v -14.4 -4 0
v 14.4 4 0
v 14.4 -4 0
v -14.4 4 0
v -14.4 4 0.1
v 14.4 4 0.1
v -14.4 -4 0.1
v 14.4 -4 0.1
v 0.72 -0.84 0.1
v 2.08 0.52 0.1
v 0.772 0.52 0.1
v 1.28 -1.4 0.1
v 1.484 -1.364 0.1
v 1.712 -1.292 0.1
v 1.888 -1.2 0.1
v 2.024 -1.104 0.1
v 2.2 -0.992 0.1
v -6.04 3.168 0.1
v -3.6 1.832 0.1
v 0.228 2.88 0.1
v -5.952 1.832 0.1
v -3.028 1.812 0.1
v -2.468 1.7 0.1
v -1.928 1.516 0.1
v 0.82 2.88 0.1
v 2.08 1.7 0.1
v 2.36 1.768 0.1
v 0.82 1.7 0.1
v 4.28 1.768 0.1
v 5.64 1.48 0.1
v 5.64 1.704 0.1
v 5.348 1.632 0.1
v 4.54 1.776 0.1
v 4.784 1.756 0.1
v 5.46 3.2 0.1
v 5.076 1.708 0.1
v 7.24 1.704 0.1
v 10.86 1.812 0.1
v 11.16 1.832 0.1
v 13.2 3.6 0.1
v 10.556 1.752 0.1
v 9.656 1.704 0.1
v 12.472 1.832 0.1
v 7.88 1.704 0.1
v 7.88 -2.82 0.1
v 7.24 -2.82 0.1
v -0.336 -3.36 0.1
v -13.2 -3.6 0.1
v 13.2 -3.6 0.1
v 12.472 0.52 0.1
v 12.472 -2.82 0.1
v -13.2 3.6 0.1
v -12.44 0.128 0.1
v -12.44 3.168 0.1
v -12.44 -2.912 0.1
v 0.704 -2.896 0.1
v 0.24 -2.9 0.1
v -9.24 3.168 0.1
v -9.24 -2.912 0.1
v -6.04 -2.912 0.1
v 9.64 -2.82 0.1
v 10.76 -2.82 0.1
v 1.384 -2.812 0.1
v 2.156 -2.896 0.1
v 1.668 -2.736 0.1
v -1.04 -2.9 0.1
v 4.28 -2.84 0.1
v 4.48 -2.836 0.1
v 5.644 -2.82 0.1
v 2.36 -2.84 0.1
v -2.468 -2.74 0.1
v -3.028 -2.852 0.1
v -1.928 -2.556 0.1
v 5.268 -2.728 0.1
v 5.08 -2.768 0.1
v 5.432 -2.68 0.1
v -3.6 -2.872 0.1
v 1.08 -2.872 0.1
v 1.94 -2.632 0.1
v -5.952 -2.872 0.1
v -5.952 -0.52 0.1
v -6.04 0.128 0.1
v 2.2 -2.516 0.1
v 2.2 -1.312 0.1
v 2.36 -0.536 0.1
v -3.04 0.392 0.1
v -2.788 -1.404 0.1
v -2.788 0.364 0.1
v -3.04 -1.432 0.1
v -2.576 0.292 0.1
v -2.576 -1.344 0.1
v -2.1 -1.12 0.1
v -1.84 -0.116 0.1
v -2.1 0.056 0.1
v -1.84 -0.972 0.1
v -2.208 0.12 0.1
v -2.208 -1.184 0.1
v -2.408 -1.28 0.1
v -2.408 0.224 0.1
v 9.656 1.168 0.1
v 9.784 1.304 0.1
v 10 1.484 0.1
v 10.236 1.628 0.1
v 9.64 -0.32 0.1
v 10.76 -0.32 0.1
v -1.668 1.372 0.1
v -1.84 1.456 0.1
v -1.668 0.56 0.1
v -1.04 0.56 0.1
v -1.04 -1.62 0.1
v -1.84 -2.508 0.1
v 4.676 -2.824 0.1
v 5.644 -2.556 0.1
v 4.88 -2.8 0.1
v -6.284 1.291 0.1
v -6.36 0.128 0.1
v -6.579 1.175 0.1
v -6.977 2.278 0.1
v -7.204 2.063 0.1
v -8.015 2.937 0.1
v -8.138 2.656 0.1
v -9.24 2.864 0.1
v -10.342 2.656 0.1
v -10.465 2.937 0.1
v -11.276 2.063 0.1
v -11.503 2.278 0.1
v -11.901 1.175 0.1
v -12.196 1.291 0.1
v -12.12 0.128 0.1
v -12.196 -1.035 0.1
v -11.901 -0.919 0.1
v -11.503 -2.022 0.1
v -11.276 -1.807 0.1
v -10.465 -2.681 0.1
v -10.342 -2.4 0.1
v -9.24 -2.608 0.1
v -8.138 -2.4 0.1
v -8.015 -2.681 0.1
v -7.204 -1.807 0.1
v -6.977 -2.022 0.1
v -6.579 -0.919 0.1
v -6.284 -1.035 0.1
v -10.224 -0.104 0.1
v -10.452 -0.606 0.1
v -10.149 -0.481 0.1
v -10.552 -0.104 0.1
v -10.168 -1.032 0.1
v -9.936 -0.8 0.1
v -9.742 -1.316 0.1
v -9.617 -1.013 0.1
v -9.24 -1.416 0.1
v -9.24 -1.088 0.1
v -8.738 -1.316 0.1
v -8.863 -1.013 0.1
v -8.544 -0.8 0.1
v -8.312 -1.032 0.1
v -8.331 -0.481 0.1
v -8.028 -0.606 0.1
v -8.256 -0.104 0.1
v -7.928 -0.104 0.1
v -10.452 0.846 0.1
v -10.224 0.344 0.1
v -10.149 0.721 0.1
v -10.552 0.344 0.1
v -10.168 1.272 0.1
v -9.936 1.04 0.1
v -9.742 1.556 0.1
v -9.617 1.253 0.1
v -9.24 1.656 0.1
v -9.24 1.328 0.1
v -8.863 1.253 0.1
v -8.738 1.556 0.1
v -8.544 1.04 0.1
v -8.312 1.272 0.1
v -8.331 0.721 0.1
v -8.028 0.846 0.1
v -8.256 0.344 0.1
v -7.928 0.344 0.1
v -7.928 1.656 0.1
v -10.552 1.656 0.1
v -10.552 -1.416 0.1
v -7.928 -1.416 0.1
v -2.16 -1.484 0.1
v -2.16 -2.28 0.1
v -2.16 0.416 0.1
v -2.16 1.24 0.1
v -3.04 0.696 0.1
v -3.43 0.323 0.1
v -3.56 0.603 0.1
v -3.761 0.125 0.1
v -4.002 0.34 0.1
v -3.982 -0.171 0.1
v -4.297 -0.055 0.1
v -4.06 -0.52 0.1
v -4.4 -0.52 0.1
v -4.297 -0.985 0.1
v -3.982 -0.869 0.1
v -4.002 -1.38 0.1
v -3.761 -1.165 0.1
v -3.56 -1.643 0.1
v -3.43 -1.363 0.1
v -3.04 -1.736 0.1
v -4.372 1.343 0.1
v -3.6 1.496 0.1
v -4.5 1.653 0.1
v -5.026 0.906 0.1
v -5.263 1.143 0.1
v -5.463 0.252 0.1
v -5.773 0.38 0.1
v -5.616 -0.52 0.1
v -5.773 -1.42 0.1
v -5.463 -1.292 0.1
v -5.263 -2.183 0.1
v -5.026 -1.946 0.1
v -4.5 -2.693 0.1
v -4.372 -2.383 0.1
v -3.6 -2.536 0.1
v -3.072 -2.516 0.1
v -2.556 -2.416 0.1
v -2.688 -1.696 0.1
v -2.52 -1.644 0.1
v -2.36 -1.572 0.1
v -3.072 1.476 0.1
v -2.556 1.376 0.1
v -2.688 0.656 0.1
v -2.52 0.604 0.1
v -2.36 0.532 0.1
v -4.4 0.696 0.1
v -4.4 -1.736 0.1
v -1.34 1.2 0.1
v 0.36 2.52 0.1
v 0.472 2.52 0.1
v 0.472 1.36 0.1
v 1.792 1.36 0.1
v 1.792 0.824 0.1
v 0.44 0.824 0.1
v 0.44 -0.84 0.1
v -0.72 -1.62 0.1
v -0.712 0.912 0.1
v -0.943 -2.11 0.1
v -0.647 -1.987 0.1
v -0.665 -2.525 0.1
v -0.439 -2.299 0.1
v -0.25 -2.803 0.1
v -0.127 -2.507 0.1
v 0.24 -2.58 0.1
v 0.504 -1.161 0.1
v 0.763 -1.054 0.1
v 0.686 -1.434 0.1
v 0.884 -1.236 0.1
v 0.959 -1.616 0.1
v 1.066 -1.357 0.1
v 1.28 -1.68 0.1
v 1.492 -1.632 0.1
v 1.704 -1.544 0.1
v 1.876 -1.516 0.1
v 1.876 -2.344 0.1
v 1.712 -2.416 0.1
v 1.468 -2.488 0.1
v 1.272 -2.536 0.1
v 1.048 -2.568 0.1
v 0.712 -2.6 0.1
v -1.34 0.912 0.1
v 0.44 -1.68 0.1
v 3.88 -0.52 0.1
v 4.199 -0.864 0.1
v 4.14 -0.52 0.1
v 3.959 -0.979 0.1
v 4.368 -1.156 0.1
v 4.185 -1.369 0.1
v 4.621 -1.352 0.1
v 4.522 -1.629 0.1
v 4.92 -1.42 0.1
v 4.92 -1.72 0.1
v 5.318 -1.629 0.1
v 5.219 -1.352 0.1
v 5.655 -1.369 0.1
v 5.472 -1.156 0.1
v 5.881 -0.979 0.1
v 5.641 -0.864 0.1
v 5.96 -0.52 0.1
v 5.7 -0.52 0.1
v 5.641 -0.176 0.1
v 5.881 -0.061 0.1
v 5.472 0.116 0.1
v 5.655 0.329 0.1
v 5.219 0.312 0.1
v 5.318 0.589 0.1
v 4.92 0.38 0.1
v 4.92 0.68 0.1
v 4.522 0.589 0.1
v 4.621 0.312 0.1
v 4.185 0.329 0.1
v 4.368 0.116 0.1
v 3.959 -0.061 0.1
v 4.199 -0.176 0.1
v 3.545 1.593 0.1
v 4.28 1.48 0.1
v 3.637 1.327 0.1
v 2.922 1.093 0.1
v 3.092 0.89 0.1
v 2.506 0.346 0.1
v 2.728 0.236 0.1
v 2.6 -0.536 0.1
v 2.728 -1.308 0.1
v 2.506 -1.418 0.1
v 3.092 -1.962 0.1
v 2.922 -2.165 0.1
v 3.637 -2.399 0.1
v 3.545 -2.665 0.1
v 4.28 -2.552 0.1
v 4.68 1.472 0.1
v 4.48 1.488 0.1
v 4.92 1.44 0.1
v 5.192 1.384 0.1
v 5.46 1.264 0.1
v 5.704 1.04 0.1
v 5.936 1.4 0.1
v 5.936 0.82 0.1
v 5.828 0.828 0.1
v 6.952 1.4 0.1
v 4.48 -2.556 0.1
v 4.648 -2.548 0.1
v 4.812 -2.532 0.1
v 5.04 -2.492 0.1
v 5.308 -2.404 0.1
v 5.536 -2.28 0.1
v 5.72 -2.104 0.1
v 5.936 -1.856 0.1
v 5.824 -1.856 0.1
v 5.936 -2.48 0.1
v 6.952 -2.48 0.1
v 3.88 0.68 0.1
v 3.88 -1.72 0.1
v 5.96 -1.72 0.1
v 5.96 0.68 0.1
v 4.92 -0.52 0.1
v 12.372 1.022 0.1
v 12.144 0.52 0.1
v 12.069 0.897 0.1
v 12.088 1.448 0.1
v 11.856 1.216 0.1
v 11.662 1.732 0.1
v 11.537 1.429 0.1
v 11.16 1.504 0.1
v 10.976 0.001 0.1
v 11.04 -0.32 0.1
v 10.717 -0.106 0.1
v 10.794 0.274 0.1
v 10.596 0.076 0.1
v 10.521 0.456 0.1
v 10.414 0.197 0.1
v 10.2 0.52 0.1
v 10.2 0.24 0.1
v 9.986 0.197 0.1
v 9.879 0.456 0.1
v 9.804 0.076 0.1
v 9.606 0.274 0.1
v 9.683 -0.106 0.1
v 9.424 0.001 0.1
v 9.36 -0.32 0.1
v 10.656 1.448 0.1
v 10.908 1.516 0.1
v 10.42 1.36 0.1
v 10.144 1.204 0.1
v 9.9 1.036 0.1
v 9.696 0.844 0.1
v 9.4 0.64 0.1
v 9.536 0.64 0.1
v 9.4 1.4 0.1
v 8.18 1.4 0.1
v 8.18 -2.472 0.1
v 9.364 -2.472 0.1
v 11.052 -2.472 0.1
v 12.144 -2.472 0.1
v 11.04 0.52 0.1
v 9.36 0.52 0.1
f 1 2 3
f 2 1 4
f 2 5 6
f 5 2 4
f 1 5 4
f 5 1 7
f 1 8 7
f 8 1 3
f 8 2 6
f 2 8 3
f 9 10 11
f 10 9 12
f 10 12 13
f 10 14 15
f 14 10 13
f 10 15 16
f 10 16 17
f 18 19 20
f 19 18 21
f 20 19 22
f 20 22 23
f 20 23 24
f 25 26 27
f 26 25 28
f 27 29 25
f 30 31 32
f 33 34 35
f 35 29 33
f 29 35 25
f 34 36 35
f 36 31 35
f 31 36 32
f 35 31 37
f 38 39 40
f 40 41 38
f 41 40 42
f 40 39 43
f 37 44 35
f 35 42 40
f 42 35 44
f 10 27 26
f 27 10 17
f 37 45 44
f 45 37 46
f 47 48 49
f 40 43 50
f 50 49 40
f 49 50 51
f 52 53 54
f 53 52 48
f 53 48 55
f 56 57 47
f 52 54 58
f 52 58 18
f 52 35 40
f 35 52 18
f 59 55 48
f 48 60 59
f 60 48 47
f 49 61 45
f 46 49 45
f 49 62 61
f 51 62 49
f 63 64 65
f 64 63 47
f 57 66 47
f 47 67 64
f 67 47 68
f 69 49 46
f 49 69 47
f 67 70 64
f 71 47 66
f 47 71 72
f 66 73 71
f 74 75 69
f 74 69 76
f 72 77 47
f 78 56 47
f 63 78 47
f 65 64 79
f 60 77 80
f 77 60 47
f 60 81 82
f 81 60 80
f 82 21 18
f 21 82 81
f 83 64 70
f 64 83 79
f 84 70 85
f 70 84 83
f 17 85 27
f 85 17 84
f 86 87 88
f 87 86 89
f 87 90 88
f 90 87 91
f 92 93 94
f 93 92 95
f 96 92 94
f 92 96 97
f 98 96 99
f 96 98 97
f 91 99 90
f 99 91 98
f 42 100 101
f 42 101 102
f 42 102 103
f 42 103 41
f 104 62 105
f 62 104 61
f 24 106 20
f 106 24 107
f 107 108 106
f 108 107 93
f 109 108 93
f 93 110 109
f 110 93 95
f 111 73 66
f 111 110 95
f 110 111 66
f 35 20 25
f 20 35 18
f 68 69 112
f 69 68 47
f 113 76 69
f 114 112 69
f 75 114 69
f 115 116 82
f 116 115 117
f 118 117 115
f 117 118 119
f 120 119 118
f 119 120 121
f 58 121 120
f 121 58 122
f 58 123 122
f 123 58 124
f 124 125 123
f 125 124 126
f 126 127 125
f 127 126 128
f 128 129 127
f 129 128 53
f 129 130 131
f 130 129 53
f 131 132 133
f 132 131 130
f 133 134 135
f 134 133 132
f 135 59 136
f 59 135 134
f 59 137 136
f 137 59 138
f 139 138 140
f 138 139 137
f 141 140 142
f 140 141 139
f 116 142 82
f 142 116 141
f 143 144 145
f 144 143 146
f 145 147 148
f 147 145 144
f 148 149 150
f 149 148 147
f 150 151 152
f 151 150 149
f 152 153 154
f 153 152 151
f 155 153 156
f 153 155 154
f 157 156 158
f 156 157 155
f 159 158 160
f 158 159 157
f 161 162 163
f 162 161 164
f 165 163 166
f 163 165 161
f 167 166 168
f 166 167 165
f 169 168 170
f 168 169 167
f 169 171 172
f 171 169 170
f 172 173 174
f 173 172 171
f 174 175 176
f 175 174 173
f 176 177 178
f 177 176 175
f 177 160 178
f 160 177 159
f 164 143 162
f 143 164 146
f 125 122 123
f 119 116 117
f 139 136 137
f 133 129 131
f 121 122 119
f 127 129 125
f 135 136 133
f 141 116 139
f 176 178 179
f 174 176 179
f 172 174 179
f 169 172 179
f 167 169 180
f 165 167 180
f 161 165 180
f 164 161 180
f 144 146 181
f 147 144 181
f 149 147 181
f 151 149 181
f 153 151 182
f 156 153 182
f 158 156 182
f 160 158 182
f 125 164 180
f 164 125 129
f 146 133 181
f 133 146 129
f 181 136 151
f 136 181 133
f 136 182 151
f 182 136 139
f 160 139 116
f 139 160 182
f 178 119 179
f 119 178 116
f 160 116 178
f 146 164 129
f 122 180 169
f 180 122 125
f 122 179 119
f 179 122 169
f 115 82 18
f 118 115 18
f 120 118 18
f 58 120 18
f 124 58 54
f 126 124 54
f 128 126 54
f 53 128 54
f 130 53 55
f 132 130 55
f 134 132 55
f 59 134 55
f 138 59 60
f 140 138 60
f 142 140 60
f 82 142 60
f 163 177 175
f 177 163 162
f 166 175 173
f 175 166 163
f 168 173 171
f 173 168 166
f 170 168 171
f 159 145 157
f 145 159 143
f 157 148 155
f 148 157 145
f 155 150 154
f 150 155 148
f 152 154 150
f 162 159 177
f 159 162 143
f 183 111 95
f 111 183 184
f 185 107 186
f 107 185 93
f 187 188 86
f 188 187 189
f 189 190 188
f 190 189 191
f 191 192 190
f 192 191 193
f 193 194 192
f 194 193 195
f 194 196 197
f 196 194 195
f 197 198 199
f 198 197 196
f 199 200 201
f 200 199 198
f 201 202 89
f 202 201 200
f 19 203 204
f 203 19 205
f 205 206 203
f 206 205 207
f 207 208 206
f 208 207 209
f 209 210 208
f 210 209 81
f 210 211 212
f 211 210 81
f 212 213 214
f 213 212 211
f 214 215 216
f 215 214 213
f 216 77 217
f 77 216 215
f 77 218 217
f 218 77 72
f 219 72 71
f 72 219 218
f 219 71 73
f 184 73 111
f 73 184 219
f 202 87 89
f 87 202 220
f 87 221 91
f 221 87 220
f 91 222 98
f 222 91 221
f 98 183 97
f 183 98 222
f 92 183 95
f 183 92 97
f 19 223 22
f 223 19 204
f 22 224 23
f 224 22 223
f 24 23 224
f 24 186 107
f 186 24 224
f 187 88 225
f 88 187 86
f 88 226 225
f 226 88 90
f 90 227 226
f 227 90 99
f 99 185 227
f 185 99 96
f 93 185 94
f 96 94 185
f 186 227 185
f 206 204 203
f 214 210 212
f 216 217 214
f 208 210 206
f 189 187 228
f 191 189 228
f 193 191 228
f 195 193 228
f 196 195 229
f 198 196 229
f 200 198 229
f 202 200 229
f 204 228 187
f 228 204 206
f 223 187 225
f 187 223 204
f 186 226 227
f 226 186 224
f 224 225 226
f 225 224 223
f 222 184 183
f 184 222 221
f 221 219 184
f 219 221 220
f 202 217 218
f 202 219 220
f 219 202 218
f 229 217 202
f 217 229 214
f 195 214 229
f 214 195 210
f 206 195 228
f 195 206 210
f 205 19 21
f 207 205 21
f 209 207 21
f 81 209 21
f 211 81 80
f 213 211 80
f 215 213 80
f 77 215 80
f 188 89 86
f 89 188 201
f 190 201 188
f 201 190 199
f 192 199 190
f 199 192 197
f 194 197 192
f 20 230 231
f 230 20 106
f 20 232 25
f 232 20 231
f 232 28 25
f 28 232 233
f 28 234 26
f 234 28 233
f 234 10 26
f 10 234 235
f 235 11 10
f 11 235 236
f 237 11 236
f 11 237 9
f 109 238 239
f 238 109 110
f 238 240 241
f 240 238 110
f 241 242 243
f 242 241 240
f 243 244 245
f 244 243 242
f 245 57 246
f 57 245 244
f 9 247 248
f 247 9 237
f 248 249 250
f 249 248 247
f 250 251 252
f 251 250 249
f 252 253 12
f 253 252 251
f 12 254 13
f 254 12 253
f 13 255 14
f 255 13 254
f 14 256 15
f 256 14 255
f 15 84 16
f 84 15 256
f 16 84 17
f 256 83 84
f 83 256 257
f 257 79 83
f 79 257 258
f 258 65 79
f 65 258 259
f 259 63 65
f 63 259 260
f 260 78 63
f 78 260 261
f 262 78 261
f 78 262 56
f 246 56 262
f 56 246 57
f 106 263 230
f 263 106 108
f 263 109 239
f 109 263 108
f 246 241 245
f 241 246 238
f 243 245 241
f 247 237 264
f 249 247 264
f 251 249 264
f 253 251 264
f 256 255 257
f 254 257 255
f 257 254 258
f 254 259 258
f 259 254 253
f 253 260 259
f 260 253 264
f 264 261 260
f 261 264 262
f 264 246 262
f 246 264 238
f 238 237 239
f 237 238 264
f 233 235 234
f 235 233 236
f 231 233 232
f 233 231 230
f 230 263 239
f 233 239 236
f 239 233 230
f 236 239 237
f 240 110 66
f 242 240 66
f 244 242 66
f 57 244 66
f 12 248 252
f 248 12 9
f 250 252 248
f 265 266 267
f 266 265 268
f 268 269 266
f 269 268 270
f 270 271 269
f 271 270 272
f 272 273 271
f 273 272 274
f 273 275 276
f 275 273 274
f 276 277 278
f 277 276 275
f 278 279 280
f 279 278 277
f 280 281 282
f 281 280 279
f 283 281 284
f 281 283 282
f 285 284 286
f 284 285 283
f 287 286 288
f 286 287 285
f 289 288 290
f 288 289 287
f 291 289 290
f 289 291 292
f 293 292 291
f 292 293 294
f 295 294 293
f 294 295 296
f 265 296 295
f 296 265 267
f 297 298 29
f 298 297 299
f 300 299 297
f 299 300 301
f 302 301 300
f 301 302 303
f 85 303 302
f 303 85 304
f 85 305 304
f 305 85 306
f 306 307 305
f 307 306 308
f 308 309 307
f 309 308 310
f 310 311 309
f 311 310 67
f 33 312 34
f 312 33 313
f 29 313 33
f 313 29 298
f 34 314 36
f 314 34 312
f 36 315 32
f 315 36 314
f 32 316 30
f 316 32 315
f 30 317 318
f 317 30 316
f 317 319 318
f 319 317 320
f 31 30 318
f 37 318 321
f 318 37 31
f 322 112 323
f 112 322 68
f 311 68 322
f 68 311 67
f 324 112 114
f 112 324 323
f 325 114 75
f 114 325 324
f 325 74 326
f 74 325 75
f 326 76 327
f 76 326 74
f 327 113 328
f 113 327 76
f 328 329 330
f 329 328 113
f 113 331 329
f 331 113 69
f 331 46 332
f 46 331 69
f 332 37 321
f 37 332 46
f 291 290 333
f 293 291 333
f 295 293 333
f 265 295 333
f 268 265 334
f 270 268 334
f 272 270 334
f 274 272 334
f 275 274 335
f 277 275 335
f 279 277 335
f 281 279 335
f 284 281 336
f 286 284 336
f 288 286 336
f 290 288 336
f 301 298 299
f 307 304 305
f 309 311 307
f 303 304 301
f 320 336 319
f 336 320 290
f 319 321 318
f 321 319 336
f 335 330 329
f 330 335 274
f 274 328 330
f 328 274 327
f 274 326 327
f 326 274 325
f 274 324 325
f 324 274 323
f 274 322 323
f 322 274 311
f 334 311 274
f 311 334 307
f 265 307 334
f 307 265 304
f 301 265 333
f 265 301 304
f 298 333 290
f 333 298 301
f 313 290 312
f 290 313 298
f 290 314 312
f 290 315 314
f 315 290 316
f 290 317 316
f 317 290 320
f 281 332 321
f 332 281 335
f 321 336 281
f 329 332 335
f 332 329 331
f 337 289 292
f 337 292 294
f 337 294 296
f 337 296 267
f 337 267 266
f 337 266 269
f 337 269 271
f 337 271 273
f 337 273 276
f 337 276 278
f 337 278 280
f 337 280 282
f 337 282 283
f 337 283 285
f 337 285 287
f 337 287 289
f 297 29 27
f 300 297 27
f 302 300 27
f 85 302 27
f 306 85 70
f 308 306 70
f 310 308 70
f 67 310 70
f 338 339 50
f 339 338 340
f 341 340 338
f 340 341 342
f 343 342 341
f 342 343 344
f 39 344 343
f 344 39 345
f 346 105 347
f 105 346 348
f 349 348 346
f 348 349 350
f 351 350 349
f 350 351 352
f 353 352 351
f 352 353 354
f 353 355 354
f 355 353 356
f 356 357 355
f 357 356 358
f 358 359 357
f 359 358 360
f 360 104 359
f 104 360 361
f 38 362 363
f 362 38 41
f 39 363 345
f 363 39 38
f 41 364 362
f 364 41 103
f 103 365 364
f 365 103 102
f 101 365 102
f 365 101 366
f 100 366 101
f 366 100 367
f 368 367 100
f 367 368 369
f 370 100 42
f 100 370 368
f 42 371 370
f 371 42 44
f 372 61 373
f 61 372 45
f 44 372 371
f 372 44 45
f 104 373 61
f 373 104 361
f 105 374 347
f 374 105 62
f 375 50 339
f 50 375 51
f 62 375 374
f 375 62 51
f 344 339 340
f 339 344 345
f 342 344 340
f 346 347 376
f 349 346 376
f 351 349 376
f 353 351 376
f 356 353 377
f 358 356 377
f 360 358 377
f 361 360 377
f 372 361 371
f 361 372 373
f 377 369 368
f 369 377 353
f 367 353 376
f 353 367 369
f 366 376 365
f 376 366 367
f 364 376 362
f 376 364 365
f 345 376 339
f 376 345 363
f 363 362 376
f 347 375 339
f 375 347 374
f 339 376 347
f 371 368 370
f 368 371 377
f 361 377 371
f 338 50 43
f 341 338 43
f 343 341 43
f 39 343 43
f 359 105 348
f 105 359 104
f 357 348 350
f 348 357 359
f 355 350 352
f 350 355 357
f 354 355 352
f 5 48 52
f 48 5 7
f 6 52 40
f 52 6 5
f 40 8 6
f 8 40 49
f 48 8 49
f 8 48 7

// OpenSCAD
use <../lib.scad>
use <../p/box5-12.scad>
use <../p/logo-octantext.scad>
$fa=1; $fs=0.2;
function ldraw_lib__821430b(realsolid=false) = [
// 0 Sticker  1.0 x  3.6 with Red and Green "Octan" Logo with Black Border
// 0 Name: 821430b.dat
// 0 Author: Gerald Lasser [GeraldLasser]
// 0 !LDRAW_ORG Part UPDATE 2022-06
// 0 !LICENSE Licensed under CC BY 2.0 and CC BY 4.0 : see CAreadme.txt
// 
// 0 BFC CERTIFY CCW
  [0,"BFC","CERTIFY"],
  [0,"BFC","CCW"],
// 
// 0 !KEYWORDS Set 4537
// 
// 0 !HISTORY 2022-12-20 [PTadmin] Official Update 2022-06
// 
// 
// 1 16 0 -.25 0 36 0 0 0 .25 0 0 0 10 box5-12.dat
  [1,16,0,-.25,0,36,0,0,0,.25,0,0,0,10, ldraw_lib__box5_12(realsolid)],
// 1 16 0 -.25 0 1 0 0 0 1 0 0 0 1 logo-octantext.dat
  [1,16,0,-.25,0,1,0,0,0,1,0,0,0,1, ldraw_lib__logo_octantext(realsolid)],
// 4 16 -36 -.25 -10 -33 -.25 -9 -33 -.25 9 -36 -.25 10
  [4,16,-36,-.25,-10,-33,-.25,-9,-33,-.25,9,-36,-.25,10],
// 4 16 -36 -.25 10 -33 -.25 9 33 -.25 9 36 -.25 10
  [4,16,-36,-.25,10,-33,-.25,9,33,-.25,9,36,-.25,10],
// 4 16 36 -.25 10 33 -.25 9 33 -.25 -9 36 -.25 -10
  [4,16,36,-.25,10,33,-.25,9,33,-.25,-9,36,-.25,-10],
// 4 16 36 -.25 -10 33 -.25 -9 -33 -.25 -9 -36 -.25 -10
  [4,16,36,-.25,-10,33,-.25,-9,-33,-.25,-9,-36,-.25,-10],
];
module ldraw_lib__821430b(step=0, col=false, unit=2/5, alt=false, line=0.2, solid=!$preview)
    makepoly(ldraw_lib__821430b(solid), step=step, col=col, unit=unit, alt=alt, line=line, solid=solid);
ldraw_lib__821430b(line=0.2);
